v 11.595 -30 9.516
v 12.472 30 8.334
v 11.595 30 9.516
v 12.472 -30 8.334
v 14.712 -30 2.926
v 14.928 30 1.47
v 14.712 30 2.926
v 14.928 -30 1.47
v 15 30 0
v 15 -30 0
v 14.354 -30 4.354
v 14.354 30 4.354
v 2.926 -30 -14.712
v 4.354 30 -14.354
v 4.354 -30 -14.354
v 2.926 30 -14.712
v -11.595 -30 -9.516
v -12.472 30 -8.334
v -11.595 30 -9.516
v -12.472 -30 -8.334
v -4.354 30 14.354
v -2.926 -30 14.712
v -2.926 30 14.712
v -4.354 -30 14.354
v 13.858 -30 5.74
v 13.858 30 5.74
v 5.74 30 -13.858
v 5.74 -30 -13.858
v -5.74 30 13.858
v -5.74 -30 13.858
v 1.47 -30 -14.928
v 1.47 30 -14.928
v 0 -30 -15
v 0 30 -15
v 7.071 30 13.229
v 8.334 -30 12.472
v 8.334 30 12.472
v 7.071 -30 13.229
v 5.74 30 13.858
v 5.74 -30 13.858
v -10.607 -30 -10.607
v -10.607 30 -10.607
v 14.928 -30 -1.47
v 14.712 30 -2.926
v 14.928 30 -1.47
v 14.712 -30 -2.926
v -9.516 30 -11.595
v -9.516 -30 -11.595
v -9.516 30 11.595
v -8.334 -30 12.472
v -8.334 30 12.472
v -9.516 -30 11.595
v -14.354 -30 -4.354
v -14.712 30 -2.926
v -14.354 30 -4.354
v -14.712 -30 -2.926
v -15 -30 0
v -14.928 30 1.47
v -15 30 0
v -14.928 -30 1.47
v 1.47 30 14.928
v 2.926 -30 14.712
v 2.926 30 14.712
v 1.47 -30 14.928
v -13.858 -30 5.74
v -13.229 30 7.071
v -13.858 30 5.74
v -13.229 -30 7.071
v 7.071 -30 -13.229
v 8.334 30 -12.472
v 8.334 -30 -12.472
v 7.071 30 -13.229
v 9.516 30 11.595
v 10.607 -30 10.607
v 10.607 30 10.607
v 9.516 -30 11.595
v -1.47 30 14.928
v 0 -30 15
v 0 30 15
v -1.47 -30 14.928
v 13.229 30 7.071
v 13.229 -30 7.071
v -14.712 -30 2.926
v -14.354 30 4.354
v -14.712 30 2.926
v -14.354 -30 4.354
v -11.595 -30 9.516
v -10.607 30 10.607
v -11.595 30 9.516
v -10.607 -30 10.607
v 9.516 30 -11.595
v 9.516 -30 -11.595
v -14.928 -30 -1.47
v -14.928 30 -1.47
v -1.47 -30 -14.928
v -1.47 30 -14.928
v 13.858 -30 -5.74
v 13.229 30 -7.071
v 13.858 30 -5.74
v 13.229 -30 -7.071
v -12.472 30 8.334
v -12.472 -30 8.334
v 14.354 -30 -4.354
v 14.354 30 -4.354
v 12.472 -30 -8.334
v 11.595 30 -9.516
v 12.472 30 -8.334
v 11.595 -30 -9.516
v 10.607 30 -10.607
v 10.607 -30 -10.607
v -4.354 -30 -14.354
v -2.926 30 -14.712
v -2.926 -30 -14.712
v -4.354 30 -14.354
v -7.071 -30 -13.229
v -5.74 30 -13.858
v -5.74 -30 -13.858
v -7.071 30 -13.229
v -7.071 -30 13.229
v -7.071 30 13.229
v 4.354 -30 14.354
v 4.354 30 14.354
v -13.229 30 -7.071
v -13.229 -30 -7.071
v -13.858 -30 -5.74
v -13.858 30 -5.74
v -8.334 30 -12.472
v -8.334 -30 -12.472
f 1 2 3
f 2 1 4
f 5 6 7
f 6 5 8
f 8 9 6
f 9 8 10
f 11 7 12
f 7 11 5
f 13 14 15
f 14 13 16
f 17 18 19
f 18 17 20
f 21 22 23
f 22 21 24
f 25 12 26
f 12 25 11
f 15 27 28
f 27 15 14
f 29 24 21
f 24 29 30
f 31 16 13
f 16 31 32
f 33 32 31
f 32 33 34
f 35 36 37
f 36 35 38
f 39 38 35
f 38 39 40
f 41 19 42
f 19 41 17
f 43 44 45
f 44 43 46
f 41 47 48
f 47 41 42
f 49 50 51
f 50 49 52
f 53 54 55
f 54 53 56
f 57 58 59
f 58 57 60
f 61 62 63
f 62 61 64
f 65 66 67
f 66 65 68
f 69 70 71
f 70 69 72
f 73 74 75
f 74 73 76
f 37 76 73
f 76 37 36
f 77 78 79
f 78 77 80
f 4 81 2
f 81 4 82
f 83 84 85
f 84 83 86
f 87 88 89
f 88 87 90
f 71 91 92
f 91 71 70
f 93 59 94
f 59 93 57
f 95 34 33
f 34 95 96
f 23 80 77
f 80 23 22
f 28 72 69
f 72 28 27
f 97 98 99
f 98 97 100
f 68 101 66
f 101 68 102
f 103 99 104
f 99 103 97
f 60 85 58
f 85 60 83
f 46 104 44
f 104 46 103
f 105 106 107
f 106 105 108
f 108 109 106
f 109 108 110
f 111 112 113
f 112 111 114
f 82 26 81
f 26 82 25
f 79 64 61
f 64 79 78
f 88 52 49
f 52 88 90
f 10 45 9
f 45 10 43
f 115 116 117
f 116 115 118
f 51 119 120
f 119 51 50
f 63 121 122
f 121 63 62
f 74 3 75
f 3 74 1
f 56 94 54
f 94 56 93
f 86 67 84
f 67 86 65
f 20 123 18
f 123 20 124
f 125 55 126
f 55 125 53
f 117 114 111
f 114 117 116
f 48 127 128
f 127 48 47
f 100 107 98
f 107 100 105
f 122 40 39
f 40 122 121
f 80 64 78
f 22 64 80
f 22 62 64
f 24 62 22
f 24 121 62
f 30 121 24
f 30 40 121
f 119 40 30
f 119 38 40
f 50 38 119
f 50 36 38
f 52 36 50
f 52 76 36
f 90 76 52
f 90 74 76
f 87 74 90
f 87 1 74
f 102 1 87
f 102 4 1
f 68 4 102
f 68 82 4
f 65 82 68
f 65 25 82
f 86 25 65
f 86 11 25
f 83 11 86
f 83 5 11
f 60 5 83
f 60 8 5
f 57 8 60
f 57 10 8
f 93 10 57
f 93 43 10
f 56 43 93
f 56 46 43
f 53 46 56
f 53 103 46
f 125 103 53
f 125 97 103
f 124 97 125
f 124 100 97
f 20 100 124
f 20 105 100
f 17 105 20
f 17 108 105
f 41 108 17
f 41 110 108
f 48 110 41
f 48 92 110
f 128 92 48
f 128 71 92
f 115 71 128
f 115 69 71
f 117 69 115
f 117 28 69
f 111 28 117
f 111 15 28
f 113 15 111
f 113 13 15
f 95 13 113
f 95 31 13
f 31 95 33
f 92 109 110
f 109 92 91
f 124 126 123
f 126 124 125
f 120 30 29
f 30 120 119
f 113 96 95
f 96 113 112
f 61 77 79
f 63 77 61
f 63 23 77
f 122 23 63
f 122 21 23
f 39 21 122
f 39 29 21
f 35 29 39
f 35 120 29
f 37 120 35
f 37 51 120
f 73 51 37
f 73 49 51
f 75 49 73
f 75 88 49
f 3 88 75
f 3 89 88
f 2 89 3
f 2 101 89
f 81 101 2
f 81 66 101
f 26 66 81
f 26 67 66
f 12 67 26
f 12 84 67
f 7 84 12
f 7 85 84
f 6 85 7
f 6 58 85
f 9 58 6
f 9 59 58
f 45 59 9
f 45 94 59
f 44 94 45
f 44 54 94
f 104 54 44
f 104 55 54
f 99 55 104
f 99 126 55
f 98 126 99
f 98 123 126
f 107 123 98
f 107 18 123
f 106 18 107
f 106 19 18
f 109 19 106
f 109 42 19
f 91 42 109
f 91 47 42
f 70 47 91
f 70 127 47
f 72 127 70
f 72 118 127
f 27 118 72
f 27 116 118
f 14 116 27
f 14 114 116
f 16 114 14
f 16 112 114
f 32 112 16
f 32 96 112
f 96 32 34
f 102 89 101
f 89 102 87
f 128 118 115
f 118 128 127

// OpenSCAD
// A single convex transparent solid with an opaque object inside it.
//
// Convex and smooth on purpose: correctly composited, its interior has no
// abrupt color steps at all, so any high-frequency structure in the image can
// only be draw-order artifacts. Transparent geometry drawn with depth writes
// enabled occludes itself triangle by triangle and fills the interior with
// stripes, which is what this scene exists to catch.
color([.2, .4, .6, .5]) rotate([90, 0, 0]) cylinder(d = 30, h = 60, center = true, $fn = 64);
color([.3, .3, .3]) sphere(d = 25, $fn = 48);
